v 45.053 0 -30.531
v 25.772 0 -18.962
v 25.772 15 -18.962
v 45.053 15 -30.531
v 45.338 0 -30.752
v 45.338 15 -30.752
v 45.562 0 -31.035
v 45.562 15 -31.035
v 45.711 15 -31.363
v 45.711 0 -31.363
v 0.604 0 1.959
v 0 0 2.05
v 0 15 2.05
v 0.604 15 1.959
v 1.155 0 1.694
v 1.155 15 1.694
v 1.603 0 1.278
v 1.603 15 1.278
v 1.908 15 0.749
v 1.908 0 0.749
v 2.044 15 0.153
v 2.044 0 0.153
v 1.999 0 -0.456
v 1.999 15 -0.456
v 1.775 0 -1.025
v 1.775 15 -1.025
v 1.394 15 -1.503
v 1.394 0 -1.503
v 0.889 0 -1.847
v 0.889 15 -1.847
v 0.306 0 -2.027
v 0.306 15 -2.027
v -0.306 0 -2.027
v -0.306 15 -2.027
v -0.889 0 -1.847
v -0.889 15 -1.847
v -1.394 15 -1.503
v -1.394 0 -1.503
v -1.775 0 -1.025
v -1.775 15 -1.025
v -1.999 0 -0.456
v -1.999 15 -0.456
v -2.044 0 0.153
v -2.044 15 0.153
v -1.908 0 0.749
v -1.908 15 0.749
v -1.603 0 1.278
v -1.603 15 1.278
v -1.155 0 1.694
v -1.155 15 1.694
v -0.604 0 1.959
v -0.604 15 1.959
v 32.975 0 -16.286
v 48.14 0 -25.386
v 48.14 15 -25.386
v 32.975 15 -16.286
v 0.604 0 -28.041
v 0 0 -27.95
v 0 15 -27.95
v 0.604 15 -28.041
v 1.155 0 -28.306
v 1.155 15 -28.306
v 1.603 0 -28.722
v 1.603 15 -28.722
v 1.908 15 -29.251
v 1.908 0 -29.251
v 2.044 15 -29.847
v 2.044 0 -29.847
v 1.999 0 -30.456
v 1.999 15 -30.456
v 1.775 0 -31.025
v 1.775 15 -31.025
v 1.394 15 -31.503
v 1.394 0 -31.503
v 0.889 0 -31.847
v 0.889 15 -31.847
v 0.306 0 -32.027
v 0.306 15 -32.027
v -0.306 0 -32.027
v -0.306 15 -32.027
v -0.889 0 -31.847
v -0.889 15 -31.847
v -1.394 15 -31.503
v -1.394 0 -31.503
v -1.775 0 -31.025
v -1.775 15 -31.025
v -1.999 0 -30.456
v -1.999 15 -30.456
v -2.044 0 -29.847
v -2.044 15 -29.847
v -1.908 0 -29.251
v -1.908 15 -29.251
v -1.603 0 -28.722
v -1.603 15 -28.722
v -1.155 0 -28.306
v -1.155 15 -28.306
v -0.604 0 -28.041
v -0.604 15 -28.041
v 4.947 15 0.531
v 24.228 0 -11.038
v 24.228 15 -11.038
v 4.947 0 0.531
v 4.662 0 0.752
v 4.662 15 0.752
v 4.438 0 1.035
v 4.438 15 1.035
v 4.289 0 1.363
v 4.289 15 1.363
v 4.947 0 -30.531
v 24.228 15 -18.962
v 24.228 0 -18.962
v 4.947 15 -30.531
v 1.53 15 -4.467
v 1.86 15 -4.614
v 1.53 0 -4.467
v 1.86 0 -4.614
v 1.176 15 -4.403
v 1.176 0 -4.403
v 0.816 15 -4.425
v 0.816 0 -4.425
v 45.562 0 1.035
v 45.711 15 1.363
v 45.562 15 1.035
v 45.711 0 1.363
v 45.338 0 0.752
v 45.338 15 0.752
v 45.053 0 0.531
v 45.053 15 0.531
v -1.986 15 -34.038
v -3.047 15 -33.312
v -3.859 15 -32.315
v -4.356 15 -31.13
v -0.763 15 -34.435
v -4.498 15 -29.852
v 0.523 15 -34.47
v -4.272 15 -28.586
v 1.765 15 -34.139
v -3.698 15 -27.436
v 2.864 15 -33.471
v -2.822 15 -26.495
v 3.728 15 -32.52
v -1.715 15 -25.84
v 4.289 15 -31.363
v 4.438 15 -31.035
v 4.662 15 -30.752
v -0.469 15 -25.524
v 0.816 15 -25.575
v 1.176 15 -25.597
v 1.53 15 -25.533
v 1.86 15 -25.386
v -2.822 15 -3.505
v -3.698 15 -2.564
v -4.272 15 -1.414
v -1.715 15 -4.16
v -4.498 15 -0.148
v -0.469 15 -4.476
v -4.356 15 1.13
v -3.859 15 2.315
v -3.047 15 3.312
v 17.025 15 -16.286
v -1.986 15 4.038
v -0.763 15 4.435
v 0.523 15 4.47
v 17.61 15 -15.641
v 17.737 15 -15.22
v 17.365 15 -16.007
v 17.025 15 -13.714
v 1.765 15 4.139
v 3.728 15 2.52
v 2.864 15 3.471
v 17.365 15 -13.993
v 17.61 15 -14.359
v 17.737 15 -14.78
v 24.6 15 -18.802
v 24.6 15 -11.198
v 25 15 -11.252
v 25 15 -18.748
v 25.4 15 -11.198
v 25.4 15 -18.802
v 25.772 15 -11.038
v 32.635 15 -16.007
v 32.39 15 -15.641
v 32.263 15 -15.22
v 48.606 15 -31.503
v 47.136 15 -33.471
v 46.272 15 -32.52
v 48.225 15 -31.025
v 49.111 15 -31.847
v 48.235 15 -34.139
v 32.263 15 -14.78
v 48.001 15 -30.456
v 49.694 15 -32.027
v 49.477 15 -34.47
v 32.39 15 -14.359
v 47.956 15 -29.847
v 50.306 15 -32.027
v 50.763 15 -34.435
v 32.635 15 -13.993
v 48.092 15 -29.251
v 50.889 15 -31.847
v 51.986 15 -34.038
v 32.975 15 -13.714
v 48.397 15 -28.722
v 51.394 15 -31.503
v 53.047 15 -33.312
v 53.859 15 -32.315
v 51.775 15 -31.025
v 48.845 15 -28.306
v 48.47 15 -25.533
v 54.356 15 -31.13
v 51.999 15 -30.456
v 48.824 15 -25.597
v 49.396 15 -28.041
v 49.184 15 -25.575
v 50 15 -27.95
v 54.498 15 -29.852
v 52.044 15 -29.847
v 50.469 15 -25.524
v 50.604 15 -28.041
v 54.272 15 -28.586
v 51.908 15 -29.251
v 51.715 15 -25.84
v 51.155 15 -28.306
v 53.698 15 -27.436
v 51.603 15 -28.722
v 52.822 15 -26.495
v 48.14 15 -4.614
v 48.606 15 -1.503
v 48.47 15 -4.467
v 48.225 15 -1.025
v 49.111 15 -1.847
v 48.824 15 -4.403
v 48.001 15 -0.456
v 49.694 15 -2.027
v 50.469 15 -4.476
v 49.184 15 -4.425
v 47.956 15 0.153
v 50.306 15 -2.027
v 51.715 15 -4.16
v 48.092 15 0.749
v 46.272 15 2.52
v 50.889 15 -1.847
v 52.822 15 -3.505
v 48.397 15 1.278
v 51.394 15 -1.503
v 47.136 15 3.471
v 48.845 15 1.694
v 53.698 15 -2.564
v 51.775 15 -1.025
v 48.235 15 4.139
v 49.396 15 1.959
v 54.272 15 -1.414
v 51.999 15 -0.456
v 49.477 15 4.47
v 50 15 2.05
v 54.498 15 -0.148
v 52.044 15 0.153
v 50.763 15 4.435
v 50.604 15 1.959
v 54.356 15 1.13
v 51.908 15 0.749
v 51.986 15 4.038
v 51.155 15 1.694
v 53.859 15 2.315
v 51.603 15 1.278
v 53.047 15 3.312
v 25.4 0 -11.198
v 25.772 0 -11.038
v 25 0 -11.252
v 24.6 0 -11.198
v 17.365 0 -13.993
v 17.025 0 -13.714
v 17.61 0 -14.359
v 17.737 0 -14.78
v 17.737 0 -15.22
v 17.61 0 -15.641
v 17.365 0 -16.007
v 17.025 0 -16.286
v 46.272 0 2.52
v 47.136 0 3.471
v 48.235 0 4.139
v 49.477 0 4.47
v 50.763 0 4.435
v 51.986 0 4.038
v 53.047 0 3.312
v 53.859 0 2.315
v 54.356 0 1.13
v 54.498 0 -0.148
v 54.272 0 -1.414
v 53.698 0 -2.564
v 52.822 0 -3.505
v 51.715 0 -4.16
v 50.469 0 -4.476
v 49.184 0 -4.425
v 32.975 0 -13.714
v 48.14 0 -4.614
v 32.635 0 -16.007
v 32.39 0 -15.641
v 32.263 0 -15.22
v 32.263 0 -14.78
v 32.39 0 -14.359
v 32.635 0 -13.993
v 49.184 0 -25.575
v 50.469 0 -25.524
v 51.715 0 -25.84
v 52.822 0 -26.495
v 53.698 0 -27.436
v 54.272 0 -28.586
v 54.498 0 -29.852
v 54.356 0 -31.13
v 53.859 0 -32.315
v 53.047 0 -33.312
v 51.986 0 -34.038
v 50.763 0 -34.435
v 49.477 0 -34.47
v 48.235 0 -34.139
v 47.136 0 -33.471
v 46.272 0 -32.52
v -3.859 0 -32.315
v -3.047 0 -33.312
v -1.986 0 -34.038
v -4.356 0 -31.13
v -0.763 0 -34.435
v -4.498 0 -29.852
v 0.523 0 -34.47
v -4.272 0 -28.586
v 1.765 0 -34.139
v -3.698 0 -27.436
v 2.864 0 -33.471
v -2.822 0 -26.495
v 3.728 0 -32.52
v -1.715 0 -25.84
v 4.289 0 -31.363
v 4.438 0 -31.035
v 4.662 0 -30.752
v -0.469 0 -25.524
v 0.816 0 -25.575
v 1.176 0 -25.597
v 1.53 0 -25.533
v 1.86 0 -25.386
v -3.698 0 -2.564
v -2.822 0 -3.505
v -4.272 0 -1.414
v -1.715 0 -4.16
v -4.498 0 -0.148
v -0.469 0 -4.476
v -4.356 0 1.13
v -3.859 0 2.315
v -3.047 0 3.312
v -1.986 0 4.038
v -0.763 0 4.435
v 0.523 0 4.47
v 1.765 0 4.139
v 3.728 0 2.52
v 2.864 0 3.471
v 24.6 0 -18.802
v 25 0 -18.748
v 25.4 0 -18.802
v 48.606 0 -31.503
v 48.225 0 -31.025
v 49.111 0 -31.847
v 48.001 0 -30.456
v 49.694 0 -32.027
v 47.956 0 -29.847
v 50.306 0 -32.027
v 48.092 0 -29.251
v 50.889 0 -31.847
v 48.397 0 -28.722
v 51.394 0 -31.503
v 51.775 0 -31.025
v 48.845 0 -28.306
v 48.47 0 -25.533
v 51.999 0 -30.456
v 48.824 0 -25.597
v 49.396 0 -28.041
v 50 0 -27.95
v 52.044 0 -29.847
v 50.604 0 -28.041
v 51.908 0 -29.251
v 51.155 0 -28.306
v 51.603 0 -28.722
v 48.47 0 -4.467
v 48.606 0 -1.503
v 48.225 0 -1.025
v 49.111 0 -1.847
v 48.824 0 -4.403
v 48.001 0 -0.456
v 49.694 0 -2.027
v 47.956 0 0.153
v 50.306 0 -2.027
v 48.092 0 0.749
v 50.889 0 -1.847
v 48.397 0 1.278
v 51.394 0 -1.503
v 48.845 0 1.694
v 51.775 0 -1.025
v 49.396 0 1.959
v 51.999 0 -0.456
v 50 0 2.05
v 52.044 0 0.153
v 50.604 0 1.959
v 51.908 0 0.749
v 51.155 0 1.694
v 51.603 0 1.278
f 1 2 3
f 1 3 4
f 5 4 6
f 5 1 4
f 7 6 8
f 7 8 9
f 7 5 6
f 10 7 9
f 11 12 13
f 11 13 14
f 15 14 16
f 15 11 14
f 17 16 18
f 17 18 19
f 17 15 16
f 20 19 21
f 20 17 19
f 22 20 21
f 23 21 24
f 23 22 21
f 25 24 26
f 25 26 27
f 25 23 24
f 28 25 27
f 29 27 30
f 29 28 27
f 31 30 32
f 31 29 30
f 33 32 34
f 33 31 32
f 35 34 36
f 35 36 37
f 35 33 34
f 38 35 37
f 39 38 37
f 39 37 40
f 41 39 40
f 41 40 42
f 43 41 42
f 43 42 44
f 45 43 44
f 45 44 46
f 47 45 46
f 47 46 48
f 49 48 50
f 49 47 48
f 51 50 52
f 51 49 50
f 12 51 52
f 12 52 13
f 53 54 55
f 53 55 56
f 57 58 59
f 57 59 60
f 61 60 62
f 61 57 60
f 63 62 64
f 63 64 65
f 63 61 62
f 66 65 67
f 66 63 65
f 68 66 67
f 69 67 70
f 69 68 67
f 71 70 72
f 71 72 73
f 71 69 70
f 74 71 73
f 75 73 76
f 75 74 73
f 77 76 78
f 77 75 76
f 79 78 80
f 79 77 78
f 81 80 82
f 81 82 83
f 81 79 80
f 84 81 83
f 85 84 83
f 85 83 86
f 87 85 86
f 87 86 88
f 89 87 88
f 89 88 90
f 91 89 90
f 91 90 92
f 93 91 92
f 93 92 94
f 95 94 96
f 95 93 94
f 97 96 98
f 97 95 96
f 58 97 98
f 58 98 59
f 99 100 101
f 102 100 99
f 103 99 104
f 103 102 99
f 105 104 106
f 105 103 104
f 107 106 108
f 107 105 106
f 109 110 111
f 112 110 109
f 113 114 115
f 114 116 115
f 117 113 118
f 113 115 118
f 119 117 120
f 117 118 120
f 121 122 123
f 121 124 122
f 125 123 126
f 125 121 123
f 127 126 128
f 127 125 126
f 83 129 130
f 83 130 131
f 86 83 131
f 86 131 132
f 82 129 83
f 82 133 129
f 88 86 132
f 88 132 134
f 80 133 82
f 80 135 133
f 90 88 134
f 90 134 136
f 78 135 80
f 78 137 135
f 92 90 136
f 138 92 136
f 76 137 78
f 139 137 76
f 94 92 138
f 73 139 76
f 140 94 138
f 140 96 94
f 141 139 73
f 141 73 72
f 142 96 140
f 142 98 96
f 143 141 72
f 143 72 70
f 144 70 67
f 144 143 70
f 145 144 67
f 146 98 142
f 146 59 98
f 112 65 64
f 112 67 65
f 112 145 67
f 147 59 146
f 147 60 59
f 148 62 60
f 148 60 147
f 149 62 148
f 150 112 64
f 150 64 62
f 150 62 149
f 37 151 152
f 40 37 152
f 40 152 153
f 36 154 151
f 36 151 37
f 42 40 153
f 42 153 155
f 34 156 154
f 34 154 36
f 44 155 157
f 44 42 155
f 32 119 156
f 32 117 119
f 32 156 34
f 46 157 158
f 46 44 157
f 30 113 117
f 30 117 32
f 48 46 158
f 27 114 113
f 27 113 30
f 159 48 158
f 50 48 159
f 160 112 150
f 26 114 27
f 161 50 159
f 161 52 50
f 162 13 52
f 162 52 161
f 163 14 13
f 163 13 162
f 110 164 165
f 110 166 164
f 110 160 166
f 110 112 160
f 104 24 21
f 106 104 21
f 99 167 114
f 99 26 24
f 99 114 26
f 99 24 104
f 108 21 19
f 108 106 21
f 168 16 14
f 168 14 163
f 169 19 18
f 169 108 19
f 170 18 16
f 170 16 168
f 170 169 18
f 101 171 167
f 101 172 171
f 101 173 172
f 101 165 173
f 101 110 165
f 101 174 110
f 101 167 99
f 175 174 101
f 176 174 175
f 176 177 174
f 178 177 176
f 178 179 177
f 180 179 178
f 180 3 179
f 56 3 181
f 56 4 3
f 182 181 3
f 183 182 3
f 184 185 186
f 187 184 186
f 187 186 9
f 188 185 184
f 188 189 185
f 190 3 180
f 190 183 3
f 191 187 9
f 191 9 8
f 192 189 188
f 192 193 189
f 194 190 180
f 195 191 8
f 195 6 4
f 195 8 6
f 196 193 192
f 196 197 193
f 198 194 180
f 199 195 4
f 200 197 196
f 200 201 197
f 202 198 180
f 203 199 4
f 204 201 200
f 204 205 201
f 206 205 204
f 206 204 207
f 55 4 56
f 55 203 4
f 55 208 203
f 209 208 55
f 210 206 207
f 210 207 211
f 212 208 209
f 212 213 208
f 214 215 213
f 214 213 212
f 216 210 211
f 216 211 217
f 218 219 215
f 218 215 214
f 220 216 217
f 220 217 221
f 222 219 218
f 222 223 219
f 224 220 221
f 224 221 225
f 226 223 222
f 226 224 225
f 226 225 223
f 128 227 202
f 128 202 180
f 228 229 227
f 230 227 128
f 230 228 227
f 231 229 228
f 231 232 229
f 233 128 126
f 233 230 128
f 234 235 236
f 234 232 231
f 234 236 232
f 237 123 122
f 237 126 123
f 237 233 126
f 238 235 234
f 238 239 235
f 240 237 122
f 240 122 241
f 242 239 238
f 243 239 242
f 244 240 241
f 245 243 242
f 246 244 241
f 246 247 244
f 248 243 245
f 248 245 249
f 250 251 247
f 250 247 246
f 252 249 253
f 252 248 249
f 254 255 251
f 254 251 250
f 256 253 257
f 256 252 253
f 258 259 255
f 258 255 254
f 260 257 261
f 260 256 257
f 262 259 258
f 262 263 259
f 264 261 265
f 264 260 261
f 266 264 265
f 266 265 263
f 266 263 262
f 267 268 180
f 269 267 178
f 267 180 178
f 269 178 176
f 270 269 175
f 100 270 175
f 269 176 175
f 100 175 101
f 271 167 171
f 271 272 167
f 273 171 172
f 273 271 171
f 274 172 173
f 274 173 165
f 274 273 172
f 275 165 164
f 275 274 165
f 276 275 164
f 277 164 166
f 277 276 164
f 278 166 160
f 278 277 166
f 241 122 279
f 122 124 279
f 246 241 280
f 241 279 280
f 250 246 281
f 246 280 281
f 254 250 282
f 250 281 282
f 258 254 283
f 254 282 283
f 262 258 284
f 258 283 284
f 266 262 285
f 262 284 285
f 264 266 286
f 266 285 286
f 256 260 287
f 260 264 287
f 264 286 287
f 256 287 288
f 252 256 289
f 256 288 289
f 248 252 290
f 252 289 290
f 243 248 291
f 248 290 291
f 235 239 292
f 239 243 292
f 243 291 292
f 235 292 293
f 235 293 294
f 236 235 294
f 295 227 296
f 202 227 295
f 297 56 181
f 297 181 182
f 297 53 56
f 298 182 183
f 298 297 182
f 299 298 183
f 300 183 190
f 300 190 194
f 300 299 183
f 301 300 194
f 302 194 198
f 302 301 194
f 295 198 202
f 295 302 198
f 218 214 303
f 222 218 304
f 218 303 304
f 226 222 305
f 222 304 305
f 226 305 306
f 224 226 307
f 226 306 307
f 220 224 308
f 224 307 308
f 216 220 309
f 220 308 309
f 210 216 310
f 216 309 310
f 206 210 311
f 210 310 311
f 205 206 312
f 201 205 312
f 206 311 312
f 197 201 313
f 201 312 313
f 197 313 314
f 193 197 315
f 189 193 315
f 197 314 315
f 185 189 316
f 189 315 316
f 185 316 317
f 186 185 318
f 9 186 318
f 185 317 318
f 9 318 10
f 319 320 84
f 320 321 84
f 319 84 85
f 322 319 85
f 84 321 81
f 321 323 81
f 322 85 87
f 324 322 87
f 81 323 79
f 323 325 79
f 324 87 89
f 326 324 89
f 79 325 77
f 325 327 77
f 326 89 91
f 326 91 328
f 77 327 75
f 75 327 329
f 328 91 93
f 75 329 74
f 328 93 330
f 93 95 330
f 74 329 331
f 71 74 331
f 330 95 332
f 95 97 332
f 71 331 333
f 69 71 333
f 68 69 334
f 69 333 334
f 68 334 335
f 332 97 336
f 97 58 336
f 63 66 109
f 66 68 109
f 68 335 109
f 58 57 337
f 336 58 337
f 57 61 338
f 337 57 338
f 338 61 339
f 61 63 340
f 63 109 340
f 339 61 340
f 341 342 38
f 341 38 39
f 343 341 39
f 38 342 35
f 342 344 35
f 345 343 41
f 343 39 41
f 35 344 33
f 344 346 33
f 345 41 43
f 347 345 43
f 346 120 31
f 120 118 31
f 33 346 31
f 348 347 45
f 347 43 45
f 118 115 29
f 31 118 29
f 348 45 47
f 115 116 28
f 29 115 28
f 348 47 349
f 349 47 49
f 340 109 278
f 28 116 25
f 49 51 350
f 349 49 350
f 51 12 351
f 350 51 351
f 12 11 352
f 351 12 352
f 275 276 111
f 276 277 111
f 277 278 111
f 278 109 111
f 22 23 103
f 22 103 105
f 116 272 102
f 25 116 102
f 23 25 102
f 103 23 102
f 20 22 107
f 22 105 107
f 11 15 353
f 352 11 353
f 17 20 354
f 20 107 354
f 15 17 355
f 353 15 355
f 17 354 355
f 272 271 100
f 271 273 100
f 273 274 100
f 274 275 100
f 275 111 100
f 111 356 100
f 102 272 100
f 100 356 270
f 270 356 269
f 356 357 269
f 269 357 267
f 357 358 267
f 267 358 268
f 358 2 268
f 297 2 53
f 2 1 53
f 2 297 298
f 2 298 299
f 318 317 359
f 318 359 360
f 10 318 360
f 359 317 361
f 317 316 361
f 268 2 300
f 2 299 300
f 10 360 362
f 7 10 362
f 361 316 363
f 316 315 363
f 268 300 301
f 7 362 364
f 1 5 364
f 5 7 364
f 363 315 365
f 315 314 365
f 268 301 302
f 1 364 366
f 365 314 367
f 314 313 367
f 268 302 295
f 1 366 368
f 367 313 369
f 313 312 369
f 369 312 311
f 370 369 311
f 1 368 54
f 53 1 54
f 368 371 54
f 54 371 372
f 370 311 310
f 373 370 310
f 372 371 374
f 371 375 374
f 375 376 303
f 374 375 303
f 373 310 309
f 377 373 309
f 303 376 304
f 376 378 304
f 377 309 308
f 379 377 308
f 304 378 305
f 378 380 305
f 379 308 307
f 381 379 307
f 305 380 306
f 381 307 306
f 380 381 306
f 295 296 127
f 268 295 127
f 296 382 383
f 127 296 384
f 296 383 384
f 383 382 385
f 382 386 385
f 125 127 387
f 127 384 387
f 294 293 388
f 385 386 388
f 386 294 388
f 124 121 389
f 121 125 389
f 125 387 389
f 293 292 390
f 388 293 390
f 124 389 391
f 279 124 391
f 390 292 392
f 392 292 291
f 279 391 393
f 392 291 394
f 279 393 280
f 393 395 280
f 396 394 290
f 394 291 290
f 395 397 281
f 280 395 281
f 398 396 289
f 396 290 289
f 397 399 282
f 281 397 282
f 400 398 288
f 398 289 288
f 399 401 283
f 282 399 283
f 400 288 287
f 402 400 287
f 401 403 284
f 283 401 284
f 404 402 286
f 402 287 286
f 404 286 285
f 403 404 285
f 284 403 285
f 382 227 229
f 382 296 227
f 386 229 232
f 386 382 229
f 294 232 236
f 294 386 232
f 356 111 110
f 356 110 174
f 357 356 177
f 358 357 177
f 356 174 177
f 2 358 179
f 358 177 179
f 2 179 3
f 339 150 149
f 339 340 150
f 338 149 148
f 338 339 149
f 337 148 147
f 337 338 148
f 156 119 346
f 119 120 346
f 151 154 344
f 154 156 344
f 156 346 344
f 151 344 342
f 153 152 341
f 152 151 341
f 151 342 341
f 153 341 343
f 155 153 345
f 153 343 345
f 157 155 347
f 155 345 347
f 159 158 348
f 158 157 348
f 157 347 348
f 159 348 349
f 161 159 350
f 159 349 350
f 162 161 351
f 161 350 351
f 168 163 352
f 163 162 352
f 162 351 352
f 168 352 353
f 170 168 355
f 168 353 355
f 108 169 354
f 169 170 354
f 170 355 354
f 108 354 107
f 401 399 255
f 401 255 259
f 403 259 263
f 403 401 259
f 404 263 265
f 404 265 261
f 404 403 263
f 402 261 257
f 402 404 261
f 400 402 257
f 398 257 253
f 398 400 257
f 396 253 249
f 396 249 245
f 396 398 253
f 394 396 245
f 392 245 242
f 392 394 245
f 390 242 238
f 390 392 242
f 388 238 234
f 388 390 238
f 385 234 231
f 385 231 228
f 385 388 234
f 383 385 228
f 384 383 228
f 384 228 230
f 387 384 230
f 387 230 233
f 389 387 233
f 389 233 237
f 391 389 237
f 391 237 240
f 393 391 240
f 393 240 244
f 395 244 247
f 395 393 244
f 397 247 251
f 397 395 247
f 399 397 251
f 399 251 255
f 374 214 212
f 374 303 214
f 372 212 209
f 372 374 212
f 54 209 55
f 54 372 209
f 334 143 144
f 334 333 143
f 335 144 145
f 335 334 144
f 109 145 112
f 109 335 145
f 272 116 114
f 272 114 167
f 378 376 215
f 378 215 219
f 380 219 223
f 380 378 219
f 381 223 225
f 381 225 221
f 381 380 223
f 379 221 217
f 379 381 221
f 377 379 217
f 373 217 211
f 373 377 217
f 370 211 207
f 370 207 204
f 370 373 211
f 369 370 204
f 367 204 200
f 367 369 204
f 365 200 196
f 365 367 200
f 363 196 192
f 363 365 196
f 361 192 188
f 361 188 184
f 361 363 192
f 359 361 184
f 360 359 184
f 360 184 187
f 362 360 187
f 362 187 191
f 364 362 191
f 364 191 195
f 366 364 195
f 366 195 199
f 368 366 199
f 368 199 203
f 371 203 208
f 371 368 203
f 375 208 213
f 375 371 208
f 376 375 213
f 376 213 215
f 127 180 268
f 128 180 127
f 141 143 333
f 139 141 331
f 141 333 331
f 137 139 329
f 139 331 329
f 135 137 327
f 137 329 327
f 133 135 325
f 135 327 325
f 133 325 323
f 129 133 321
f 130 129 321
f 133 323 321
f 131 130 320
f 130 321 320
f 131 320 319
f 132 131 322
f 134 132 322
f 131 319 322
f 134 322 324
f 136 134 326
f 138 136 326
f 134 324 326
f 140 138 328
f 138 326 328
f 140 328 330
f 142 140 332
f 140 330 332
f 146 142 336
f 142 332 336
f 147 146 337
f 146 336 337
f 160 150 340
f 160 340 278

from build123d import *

# Parameters (mm, degrees)
SKETCH_1_R        = 4.5
SKETCH_1_R_2      = 2.05
EXTRUDE_1_DEPTH   = 15
EXTRUDE_1_2_DEPTH = 15
EXTRUDE_1_3_DEPTH = 15
EXTRUDE_1_4_DEPTH = 15
SKETCH_2_R        = 2.05
EXTRUDE_2_DEPTH   = 15
EXTRUDE_START     = -15
SKETCH_3_R        = 2.05
EXTRUDE_3_DEPTH   = 15
FILLET_1_R        = 1.5


with BuildPart() as part:
    # 草图1 → 凸台-拉伸1 (new body)
    with BuildSketch(Plane(origin=(0, 0, 0), x_dir=(1, 0, 0), z_dir=(0, 1, 0))):
        with Locations(Location((0, 0, 0), (0, 0, 270))):
            Circle(SKETCH_1_R)
        with Locations(Location((0, 0, 0), (0, 0, 270))):
            Circle(SKETCH_1_R_2, mode=Mode.SUBTRACT)
    extrude(amount=EXTRUDE_1_DEPTH)



with BuildPart() as body_2:
    # 草图1 → Extrude 1 2 (new body)
    with BuildSketch(Plane(origin=(0, 0, 0), x_dir=(1, 0, 0), z_dir=(0, 1, 0))):
        with Locations(Location((0, 30, 0), (0, 0, 270))):
            Circle(SKETCH_1_R)
        with Locations(Location((0, 30, 0), (0, 0, 270))):
            Circle(SKETCH_1_R_2, mode=Mode.SUBTRACT)
    extrude(amount=EXTRUDE_1_2_DEPTH)



with BuildPart() as body_3:
    # 草图1 → Extrude 1 3 (new body)
    with BuildSketch(Plane(origin=(0, 0, 0), x_dir=(1, 0, 0), z_dir=(0, 1, 0))):
        with Locations(Location((50, 30, 0), (0, 0, 270))):
            Circle(SKETCH_1_R)
        with Locations(Location((50, 30, 0), (0, 0, 270))):
            Circle(SKETCH_1_R_2, mode=Mode.SUBTRACT)
    extrude(amount=EXTRUDE_1_3_DEPTH)


with BuildPart() as body_4:
    # 草图1 → Extrude 1 4 (new body)
    with BuildSketch(Plane(origin=(0, 0, 0), x_dir=(1, 0, 0), z_dir=(0, 1, 0))):
        with Locations(Location((50, 0, 0), (0, 0, 270))):
            Circle(SKETCH_1_R)
        with Locations(Location((50, 0, 0), (0, 0, 270))):
            Circle(SKETCH_1_R_2, mode=Mode.SUBTRACT)
    extrude(amount=EXTRUDE_1_4_DEPTH)


with BuildPart() as body_2_1:
    add(body_2.part)

    add(body_4.part)  # 凸台-拉伸2 merges body 4
    # 草图2 → 凸台-拉伸2 (add)
    with BuildSketch(Plane(origin=(0, 15, 0), x_dir=(1, 0, 0), z_dir=(0, 1, 0))):
        with BuildLine():
            Line((51.543487266, 2.572478777), (1.543487266, 32.572478777))
            ThreePointArc((1.543487266, 32.572478777), (-2.572478777, 31.543487266), (-1.543487266, 27.427521223))
            Line((-1.543487266, 27.427521223), (48.456512734, -2.572478777))
            ThreePointArc((48.456512734, -2.572478777), (52.572478777, -1.543487266), (51.543487266, 2.572478777))
        make_face()
        with Locations(Location((0, 30, 0), (0, 0, 270))):
            Circle(SKETCH_2_R, mode=Mode.SUBTRACT)
        with Locations(Location((50, 0, 0), (0, 0, 270))):
            Circle(SKETCH_2_R, mode=Mode.SUBTRACT)
    extrude(amount=-EXTRUDE_2_DEPTH)


with BuildPart() as part_1:
    add(part.part)

    add(body_2_1.part)  # 凸台-拉伸3 merges body 2

    add(body_3.part)  # 凸台-拉伸3 merges body 3
    # 草图3 → 凸台-拉伸3 (add)
    with BuildSketch(Plane(origin=(0, 15, 0), x_dir=(1, 0, 0), z_dir=(0, 1, 0)).offset(EXTRUDE_START)):
        with BuildLine():
            Line((-1.543487266, 2.572478777), (48.456512734, 32.572478777))
            ThreePointArc((48.456512734, 32.572478777), (52.572478777, 31.543487266), (51.543487266, 27.427521223))
            Line((51.543487266, 27.427521223), (1.543487266, -2.572478777))
            ThreePointArc((1.543487266, -2.572478777), (-2.572478777, -1.543487266), (-1.543487266, 2.572478777))
        make_face()
        with Locations(Location((0, 0, 0), (0, 0, 270))):
            Circle(SKETCH_3_R, mode=Mode.SUBTRACT)
        with Locations(Location((50, 30, 0), (0, 0, 270))):
            Circle(SKETCH_3_R, mode=Mode.SUBTRACT)
    extrude(amount=EXTRUDE_3_DEPTH)

    # 圆角1
    fillet_1_edges = [part_1.edges().sort_by_distance(p)[0] for p in [
        (1.332631442, 7.5, -4.298150002),
        (4.419605974, 7.5, 0.846807552),
        (45.580394026, 7.5, -30.846807552),
        (48.667368558, 7.5, -25.701849998),
        (30.830951895, 7.5, -15),
        (48.667368558, 7.5, -4.298150002),
        (25, 7.5, -11.501428863),
        (45.580394026, 7.5, 0.846807552),
        (25, 7.5, -18.498571137),
        (19.169048105, 7.5, -15),
        (4.419605974, 7.5, -30.846807552),
        (1.332631442, 7.5, -25.701849998),
    ]]
    fillet(fillet_1_edges, radius=FILLET_1_R)


solid = part_1.part
